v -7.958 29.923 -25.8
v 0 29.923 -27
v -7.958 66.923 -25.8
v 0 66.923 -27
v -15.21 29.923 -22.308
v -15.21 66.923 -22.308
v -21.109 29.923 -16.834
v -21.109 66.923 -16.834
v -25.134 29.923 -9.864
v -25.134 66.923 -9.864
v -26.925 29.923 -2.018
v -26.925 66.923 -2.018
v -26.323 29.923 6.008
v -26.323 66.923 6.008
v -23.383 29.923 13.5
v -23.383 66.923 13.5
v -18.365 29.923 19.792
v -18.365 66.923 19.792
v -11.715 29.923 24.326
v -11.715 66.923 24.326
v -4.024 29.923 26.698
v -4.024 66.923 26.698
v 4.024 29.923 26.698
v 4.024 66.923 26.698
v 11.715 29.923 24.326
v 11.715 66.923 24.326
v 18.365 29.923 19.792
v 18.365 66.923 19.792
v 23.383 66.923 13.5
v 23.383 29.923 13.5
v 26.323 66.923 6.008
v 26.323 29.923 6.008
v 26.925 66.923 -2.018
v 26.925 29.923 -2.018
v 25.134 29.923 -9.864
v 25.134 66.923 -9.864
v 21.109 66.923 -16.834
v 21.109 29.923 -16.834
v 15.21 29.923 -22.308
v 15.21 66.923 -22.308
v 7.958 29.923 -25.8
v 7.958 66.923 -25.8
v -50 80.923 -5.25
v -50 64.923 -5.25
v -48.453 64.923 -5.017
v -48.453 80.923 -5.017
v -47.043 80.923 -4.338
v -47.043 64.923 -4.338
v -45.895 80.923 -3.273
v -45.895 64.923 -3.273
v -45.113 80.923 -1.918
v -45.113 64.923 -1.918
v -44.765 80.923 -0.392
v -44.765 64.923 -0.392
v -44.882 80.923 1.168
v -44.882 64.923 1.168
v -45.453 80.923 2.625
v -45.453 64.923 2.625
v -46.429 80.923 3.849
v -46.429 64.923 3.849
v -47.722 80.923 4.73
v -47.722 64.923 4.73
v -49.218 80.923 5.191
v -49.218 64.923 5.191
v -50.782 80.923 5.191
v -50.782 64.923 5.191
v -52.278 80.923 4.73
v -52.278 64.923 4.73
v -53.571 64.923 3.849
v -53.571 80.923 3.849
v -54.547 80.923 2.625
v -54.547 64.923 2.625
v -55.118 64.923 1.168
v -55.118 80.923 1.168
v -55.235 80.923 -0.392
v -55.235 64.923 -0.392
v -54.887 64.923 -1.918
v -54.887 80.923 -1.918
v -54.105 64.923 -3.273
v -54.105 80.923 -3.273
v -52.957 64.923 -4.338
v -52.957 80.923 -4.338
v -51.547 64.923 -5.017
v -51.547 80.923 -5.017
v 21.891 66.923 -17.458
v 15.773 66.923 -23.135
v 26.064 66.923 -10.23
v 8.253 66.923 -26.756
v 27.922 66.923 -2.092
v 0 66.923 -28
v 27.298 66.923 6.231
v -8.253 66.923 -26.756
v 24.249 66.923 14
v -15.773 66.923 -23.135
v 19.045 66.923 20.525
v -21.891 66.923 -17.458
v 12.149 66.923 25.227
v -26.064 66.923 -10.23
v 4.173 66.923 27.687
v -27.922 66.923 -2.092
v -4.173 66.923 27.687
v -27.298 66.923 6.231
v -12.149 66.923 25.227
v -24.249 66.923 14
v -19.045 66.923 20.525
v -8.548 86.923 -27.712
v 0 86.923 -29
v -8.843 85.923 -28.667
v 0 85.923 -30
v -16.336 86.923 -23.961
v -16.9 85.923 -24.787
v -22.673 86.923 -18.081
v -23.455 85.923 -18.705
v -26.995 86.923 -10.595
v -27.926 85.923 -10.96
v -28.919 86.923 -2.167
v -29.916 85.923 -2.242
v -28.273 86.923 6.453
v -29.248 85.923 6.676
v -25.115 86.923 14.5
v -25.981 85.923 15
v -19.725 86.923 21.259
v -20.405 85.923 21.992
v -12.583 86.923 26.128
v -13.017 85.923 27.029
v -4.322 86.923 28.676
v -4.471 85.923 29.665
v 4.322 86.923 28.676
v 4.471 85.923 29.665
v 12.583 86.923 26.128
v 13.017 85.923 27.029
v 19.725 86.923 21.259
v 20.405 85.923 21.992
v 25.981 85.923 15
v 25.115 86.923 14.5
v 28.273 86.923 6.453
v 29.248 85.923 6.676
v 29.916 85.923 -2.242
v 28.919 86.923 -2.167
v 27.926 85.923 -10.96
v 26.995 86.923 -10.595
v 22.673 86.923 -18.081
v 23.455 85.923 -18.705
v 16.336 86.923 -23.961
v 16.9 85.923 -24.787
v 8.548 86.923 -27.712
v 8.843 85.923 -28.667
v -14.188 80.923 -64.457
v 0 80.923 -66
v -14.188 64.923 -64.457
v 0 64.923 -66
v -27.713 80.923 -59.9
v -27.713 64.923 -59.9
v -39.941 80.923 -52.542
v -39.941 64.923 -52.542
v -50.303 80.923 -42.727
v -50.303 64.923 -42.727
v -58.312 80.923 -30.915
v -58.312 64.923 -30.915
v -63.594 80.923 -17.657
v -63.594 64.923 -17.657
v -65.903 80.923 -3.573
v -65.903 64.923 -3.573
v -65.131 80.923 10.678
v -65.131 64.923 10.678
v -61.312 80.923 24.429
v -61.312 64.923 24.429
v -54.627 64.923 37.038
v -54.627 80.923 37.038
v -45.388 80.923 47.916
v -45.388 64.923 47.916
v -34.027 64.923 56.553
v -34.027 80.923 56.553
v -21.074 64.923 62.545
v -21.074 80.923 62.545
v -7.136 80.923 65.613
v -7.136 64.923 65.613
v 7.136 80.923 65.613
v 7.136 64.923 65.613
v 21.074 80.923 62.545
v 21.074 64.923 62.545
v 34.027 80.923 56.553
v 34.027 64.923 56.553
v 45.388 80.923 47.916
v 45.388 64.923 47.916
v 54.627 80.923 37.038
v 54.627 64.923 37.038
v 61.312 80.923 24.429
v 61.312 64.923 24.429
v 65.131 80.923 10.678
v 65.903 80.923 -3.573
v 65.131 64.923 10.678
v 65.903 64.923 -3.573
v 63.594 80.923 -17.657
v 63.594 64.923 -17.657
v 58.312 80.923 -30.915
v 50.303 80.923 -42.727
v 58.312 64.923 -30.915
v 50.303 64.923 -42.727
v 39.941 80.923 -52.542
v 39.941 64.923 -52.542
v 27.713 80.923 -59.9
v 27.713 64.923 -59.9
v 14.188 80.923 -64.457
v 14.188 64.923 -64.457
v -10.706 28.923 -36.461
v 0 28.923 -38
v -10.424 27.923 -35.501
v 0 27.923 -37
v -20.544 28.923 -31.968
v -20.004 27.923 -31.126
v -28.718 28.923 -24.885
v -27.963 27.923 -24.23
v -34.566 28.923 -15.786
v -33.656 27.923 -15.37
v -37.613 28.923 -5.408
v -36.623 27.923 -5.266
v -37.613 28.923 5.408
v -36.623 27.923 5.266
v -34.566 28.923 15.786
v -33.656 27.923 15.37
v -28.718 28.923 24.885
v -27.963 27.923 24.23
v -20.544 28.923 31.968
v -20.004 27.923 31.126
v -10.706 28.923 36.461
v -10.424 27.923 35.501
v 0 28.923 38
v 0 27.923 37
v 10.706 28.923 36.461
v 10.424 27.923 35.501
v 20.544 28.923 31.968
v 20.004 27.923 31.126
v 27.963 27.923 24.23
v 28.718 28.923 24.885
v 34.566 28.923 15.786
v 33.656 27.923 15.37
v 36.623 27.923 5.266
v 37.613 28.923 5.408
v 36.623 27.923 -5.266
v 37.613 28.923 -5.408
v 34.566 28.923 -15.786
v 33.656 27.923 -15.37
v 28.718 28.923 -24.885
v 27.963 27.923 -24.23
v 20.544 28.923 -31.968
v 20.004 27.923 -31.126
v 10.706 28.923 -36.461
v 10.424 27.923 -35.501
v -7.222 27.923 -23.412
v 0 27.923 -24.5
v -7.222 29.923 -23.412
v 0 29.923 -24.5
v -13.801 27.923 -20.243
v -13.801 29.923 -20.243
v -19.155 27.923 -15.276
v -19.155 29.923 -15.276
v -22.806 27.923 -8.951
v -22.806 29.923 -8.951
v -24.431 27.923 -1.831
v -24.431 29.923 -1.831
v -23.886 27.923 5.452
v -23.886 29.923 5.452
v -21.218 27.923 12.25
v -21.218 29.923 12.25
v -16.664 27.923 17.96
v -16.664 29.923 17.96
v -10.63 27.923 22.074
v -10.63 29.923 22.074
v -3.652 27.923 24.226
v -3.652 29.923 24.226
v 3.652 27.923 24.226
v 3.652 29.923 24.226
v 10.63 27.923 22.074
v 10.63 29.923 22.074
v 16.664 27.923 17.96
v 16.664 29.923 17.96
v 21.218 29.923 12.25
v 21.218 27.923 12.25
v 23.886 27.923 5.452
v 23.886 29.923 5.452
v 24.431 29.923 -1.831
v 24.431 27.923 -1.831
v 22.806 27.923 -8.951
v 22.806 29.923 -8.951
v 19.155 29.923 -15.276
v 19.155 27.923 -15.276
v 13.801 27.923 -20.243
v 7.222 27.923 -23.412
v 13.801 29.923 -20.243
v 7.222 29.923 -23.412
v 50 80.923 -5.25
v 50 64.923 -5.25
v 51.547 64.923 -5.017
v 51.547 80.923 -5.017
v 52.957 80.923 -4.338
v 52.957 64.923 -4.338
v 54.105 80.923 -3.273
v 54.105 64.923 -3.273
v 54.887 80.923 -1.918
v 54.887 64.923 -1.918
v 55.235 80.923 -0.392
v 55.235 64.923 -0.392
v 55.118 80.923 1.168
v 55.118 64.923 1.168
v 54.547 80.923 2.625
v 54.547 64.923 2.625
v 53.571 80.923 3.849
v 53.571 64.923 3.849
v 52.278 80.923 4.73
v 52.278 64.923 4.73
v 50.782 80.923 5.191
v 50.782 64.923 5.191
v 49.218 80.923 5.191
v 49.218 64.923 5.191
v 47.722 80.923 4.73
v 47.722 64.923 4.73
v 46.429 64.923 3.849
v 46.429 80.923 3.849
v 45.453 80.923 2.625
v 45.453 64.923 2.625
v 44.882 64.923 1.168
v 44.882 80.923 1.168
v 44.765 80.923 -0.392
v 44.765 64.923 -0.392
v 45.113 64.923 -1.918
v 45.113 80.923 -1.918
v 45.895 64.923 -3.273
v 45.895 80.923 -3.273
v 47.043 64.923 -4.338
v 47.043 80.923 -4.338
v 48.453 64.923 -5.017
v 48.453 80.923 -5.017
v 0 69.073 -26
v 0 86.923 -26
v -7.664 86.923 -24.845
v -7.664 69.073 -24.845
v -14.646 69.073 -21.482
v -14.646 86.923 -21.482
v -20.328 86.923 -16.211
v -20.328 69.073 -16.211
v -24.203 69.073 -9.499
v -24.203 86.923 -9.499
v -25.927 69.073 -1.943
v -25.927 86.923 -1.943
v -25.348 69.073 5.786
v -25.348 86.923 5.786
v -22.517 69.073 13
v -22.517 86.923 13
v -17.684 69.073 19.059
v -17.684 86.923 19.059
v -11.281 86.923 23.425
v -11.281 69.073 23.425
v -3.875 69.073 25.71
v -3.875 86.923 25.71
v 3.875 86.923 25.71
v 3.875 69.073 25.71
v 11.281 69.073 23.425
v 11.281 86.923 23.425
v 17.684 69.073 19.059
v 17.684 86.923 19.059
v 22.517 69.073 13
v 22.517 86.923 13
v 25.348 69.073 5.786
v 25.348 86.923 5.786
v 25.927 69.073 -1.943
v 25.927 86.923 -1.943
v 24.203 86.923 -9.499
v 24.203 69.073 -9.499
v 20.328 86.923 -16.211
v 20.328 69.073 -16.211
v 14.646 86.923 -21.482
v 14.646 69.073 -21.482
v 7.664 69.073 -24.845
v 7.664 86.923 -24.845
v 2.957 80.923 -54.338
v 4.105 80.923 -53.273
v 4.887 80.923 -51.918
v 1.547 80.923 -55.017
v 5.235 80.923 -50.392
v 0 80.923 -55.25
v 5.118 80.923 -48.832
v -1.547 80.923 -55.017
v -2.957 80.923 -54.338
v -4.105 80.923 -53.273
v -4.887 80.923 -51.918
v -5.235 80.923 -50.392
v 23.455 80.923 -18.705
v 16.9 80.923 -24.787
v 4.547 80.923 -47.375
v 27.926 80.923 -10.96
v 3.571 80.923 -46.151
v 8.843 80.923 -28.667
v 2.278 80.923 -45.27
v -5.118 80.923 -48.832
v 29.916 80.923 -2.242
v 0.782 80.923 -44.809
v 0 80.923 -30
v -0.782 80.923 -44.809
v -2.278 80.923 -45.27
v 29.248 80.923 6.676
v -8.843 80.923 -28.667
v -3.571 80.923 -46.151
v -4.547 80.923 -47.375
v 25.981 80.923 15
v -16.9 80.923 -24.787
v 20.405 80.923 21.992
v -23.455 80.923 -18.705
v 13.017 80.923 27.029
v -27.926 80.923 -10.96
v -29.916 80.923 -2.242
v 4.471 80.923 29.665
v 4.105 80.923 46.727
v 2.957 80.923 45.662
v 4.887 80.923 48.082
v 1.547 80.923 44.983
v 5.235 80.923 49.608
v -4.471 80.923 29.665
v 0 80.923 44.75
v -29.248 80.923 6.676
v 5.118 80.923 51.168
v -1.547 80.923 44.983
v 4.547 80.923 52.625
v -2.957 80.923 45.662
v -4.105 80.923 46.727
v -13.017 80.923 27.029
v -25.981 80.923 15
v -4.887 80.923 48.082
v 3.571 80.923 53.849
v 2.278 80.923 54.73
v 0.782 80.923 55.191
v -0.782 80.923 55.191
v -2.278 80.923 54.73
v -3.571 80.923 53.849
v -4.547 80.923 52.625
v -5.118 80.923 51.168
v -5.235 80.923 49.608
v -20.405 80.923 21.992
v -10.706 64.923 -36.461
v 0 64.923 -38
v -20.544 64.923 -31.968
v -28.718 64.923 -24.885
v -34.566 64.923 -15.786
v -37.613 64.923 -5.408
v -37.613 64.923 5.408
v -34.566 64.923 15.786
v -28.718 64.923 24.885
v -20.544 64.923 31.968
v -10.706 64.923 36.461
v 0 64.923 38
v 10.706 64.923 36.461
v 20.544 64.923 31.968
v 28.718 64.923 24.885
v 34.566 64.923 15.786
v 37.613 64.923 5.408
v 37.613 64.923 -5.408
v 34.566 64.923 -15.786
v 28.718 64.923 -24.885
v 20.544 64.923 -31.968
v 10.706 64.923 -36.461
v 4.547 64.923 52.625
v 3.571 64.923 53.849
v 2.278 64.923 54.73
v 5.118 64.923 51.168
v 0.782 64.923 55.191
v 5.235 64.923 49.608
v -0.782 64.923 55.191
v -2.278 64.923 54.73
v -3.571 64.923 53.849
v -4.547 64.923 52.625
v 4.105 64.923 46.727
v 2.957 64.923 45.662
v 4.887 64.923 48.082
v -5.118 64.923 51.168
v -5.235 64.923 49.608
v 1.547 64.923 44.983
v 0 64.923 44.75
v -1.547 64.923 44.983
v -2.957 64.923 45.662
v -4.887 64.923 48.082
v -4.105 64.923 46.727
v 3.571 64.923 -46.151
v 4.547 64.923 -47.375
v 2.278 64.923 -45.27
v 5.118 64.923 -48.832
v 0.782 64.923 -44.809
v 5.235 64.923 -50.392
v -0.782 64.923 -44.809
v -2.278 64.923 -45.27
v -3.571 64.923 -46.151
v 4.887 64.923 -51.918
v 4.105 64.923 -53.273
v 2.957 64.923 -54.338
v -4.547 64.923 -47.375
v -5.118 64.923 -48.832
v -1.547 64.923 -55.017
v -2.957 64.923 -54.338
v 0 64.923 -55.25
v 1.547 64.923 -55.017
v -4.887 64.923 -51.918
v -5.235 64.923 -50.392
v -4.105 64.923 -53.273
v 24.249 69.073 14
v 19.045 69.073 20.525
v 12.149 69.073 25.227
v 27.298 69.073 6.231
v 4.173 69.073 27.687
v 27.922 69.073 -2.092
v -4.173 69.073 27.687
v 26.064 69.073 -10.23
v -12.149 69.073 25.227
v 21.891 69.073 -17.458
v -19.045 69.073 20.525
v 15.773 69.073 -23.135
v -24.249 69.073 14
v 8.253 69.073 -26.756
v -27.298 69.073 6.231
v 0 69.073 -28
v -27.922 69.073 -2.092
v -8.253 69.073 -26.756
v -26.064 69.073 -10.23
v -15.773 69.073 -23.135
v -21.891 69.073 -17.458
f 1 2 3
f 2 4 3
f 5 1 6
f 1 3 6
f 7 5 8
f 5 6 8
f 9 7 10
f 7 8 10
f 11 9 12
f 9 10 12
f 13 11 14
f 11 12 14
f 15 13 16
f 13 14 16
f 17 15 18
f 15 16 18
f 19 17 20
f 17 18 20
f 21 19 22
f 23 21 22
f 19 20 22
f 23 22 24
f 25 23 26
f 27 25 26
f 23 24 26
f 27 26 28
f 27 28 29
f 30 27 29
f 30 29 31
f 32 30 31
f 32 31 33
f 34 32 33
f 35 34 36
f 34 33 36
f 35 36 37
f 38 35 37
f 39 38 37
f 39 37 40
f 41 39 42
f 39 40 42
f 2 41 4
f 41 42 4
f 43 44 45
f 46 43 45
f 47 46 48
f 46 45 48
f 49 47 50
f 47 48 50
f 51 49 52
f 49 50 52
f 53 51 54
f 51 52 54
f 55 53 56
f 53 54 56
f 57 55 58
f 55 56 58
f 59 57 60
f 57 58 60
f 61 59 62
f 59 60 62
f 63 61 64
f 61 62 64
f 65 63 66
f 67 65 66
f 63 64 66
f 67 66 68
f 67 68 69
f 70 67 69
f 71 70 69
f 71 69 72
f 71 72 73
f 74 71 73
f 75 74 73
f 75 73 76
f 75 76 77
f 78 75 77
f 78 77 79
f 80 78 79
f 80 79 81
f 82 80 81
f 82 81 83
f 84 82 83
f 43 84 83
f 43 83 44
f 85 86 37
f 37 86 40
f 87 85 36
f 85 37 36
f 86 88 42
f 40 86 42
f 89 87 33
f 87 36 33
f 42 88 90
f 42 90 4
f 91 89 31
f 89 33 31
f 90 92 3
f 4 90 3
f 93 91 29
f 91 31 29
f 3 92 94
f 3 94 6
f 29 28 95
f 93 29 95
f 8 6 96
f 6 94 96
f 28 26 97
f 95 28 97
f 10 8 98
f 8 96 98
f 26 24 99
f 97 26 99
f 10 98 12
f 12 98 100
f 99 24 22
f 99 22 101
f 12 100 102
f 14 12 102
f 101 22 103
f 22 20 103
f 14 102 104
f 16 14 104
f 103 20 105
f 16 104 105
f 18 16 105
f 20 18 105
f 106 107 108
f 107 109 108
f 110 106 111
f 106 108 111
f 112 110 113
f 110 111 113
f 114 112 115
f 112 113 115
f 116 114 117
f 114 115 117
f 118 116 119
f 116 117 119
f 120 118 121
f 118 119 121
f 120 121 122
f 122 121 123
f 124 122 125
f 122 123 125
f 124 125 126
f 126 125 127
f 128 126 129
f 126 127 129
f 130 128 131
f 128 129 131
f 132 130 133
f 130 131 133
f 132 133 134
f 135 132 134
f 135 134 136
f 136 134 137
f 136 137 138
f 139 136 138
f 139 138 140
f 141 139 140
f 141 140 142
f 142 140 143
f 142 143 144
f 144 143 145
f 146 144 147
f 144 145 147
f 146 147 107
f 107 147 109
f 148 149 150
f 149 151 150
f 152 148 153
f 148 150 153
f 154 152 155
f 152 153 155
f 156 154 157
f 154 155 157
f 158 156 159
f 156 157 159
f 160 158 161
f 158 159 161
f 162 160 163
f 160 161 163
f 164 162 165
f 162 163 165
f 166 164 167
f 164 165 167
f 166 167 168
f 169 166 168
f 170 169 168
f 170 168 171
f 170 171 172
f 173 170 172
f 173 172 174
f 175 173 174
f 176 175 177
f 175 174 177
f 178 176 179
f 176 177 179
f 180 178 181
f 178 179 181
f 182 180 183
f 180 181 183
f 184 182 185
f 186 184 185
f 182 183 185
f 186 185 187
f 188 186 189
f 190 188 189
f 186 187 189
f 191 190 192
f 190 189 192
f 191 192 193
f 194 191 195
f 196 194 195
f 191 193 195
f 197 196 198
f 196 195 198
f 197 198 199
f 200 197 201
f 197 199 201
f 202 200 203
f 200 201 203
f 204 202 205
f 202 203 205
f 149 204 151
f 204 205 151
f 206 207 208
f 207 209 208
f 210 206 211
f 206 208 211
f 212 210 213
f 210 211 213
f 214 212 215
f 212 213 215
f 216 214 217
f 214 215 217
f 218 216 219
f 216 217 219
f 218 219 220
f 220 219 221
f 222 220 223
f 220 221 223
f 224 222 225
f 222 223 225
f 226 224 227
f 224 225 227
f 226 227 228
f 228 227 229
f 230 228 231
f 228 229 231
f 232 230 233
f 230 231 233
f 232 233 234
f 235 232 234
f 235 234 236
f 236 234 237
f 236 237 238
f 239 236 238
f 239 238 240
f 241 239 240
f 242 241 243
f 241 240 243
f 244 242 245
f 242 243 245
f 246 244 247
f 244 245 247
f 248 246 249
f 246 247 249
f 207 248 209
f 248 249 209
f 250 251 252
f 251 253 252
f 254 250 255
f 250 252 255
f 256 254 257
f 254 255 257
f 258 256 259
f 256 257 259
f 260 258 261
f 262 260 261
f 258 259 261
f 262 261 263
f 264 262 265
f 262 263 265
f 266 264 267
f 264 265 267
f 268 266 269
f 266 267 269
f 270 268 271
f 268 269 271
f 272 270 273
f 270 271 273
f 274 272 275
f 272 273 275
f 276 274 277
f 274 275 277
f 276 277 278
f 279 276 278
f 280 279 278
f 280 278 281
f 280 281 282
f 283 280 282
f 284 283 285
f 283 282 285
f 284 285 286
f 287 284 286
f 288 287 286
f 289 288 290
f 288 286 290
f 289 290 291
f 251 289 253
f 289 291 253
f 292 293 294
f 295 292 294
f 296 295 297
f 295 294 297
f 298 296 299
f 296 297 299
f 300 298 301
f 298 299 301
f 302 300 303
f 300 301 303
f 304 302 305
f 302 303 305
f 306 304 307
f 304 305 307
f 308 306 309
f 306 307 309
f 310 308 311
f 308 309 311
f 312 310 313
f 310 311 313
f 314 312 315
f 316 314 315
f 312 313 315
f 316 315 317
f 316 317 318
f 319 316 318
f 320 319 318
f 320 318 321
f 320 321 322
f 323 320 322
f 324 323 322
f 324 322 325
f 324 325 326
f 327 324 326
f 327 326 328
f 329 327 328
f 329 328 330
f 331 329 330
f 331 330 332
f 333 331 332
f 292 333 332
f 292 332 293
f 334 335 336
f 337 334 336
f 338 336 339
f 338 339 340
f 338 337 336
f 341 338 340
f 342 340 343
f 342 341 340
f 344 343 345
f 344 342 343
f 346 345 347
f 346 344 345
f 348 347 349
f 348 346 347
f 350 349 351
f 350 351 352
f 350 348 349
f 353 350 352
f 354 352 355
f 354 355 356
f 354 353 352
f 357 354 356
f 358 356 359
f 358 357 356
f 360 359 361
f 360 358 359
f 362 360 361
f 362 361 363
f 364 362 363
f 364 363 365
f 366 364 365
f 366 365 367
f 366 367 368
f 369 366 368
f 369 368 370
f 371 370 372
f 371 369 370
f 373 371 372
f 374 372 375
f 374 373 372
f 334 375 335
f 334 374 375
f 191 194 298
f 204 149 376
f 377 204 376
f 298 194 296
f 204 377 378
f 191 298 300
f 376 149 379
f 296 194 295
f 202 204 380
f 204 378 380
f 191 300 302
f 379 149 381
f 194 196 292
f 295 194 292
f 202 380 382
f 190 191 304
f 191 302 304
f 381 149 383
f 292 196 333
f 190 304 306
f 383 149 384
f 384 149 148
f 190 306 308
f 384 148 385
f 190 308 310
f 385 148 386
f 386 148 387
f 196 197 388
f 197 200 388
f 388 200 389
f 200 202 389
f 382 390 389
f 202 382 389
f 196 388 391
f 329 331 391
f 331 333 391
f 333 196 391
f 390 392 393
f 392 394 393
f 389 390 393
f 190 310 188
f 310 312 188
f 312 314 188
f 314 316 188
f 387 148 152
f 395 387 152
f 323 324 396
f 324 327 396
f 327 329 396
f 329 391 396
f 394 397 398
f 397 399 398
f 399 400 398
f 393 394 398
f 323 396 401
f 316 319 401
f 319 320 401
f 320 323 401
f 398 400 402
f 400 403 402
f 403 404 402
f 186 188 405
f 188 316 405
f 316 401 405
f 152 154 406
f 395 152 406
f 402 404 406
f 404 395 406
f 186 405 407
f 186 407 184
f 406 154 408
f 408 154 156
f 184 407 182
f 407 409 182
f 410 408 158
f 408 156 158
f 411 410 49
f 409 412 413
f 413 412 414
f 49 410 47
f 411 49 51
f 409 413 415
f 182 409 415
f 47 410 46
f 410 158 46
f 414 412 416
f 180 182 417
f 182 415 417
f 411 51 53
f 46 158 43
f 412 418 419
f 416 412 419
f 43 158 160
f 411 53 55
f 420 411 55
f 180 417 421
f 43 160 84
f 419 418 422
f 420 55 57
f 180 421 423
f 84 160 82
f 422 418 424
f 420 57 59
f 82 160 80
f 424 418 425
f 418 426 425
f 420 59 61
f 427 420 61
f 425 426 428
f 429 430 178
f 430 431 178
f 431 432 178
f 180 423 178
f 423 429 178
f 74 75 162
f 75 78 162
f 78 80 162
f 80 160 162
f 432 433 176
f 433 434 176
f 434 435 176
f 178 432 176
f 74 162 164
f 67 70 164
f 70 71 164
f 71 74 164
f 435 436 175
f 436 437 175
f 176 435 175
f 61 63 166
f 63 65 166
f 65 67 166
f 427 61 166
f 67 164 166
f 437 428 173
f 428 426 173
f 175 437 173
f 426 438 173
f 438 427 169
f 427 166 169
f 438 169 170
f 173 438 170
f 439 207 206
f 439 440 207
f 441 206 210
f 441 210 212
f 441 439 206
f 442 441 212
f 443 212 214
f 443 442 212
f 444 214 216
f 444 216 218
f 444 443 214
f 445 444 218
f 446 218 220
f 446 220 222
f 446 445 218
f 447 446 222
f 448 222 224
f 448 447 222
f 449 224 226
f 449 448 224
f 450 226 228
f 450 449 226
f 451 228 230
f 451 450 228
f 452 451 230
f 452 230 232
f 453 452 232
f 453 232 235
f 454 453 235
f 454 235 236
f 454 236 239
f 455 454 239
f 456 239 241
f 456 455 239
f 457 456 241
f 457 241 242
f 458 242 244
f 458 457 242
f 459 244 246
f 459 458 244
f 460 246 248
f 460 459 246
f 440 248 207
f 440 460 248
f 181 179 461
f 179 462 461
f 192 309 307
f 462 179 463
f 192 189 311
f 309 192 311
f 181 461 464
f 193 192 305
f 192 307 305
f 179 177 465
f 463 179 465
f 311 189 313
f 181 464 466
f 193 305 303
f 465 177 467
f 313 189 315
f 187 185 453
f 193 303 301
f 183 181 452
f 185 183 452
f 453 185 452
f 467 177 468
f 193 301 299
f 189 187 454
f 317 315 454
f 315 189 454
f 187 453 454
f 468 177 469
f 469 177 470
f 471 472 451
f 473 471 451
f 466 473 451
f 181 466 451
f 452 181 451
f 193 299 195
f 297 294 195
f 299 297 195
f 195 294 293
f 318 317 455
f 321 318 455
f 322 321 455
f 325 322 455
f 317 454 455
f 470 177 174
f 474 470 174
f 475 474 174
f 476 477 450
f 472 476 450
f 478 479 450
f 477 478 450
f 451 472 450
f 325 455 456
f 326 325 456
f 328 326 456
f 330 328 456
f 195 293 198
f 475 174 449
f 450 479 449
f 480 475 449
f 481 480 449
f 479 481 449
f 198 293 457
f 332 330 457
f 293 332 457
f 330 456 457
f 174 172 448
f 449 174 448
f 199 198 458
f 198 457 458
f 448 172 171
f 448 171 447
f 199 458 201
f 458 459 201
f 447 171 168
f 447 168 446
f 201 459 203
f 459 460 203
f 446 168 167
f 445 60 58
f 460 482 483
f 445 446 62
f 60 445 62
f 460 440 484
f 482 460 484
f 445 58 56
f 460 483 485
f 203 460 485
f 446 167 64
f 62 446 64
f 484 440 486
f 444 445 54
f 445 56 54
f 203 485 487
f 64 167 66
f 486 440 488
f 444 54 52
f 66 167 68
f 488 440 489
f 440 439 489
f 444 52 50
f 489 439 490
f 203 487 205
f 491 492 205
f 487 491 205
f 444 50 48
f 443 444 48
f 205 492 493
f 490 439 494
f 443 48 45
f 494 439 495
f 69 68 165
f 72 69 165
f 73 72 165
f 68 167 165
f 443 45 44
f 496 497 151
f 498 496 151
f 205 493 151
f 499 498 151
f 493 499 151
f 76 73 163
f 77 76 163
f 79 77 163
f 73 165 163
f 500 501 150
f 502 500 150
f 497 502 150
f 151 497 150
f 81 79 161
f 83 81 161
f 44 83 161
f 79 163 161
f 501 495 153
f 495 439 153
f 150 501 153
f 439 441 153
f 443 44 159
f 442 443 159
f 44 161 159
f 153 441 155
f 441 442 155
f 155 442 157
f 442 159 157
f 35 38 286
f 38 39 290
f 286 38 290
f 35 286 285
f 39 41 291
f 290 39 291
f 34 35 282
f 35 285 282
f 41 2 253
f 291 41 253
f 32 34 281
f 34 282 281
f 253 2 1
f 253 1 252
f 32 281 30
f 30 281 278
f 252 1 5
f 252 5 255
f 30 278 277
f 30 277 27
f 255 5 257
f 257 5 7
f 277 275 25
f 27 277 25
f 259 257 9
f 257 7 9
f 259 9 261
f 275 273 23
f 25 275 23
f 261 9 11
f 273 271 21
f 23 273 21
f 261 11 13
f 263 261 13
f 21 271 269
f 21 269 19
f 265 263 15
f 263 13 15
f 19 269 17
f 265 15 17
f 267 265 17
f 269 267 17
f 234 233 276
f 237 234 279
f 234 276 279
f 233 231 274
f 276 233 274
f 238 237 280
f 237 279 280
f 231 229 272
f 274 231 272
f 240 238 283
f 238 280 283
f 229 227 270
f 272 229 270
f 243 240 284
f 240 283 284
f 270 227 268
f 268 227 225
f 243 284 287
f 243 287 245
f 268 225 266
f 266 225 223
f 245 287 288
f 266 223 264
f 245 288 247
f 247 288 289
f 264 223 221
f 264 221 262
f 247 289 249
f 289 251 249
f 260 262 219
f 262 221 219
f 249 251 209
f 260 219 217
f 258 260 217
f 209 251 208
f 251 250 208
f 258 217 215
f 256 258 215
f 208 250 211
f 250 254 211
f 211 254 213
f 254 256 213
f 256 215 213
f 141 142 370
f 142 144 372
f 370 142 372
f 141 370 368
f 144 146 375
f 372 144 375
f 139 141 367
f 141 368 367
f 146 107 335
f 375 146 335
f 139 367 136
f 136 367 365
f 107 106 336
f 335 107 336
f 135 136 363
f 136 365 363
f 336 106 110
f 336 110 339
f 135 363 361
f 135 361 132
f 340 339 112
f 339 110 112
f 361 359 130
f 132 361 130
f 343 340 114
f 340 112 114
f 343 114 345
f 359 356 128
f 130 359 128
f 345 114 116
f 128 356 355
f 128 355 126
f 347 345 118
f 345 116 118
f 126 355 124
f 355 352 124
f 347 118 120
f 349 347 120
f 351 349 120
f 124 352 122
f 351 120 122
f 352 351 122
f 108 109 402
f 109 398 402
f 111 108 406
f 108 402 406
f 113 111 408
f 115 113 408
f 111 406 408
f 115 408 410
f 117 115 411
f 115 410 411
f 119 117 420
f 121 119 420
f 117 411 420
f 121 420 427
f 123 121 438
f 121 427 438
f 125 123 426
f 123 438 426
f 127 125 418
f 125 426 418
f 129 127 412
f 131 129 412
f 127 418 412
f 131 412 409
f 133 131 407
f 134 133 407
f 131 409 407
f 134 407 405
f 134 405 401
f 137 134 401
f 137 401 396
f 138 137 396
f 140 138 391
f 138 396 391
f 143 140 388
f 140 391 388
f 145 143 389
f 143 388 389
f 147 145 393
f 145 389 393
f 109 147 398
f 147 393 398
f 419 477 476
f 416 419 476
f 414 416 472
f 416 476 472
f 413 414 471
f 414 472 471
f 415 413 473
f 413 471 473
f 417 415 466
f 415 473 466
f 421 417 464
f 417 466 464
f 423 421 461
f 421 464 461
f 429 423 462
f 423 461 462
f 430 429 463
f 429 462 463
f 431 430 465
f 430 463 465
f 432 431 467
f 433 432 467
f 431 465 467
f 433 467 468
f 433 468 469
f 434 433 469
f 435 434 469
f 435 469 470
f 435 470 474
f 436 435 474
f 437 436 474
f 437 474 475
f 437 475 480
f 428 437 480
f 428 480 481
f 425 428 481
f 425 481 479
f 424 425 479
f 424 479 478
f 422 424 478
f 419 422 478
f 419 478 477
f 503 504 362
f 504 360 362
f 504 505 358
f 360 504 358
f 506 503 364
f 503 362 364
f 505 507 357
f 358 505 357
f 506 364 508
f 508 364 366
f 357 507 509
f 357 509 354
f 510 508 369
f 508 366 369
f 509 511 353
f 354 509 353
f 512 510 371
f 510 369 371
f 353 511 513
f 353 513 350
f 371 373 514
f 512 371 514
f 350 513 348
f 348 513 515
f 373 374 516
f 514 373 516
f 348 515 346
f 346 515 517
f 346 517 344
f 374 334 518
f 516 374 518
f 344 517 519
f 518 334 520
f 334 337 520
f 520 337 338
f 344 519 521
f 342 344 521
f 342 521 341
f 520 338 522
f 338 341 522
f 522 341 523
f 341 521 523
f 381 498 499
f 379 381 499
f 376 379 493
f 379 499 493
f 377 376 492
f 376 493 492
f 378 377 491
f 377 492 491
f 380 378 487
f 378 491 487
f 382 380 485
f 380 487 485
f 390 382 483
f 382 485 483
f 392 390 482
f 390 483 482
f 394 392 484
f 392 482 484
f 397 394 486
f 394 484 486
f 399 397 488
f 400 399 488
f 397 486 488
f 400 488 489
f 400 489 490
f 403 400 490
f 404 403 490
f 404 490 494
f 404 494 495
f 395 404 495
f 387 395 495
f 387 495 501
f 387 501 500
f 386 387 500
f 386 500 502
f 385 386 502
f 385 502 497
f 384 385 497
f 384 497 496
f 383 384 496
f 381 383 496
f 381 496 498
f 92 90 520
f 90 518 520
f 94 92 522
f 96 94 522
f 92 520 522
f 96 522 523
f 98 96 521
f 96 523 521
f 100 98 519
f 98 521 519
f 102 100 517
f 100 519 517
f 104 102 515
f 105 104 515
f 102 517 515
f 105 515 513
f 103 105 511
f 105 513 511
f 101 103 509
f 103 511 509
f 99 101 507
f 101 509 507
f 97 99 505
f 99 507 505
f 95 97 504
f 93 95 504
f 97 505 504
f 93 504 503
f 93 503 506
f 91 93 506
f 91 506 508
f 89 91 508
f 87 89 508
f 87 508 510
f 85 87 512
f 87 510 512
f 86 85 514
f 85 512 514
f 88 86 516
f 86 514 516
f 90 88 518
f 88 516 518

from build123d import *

# Parameters (mm, degrees)
OTW_R_GWINTOWANY_M12X1_51_D = 10.5


with BuildPart() as part:
    # Szkic1 → Obrót1 (revolve)
    with BuildSketch(Plane.XY, mode=Mode.PRIVATE) as obr_t1_sk:
        Polygon((30, 80.923148938), (66, 80.923148938), (66, 64.923148938), (38, 64.923148938), (38, 39.923148938), (38, 28.923148938), (37, 27.923148938), (24.5, 27.923148938), (24.5, 29.923148938), (27, 29.923148938), (27, 66.923148938), (28, 66.923148938), (28, 69.073148938), (26, 69.073148938), (26, 80.923148938), (26, 86.923148938), (29, 86.923148938), (30, 85.923148938), align=None)
    revolve(obr_t1_sk.sketch.rotate(Axis((0, 0, 0), (0, 1, 0)), 90), axis=Axis((0, 0, 0), (0, 1, 0)))

    # Otwór gwintowany M12x1.51 (through all)
    with Locations(Plane(origin=(-50, 80.923148938, 0), x_dir=(0, 0, 1), z_dir=(0, 1, 0))):
        with Locations((0, 0), (-50, 50), (0, 100), (50, 50)):
            Hole(OTW_R_GWINTOWANY_M12X1_51_D / 2)


solid = part.part
